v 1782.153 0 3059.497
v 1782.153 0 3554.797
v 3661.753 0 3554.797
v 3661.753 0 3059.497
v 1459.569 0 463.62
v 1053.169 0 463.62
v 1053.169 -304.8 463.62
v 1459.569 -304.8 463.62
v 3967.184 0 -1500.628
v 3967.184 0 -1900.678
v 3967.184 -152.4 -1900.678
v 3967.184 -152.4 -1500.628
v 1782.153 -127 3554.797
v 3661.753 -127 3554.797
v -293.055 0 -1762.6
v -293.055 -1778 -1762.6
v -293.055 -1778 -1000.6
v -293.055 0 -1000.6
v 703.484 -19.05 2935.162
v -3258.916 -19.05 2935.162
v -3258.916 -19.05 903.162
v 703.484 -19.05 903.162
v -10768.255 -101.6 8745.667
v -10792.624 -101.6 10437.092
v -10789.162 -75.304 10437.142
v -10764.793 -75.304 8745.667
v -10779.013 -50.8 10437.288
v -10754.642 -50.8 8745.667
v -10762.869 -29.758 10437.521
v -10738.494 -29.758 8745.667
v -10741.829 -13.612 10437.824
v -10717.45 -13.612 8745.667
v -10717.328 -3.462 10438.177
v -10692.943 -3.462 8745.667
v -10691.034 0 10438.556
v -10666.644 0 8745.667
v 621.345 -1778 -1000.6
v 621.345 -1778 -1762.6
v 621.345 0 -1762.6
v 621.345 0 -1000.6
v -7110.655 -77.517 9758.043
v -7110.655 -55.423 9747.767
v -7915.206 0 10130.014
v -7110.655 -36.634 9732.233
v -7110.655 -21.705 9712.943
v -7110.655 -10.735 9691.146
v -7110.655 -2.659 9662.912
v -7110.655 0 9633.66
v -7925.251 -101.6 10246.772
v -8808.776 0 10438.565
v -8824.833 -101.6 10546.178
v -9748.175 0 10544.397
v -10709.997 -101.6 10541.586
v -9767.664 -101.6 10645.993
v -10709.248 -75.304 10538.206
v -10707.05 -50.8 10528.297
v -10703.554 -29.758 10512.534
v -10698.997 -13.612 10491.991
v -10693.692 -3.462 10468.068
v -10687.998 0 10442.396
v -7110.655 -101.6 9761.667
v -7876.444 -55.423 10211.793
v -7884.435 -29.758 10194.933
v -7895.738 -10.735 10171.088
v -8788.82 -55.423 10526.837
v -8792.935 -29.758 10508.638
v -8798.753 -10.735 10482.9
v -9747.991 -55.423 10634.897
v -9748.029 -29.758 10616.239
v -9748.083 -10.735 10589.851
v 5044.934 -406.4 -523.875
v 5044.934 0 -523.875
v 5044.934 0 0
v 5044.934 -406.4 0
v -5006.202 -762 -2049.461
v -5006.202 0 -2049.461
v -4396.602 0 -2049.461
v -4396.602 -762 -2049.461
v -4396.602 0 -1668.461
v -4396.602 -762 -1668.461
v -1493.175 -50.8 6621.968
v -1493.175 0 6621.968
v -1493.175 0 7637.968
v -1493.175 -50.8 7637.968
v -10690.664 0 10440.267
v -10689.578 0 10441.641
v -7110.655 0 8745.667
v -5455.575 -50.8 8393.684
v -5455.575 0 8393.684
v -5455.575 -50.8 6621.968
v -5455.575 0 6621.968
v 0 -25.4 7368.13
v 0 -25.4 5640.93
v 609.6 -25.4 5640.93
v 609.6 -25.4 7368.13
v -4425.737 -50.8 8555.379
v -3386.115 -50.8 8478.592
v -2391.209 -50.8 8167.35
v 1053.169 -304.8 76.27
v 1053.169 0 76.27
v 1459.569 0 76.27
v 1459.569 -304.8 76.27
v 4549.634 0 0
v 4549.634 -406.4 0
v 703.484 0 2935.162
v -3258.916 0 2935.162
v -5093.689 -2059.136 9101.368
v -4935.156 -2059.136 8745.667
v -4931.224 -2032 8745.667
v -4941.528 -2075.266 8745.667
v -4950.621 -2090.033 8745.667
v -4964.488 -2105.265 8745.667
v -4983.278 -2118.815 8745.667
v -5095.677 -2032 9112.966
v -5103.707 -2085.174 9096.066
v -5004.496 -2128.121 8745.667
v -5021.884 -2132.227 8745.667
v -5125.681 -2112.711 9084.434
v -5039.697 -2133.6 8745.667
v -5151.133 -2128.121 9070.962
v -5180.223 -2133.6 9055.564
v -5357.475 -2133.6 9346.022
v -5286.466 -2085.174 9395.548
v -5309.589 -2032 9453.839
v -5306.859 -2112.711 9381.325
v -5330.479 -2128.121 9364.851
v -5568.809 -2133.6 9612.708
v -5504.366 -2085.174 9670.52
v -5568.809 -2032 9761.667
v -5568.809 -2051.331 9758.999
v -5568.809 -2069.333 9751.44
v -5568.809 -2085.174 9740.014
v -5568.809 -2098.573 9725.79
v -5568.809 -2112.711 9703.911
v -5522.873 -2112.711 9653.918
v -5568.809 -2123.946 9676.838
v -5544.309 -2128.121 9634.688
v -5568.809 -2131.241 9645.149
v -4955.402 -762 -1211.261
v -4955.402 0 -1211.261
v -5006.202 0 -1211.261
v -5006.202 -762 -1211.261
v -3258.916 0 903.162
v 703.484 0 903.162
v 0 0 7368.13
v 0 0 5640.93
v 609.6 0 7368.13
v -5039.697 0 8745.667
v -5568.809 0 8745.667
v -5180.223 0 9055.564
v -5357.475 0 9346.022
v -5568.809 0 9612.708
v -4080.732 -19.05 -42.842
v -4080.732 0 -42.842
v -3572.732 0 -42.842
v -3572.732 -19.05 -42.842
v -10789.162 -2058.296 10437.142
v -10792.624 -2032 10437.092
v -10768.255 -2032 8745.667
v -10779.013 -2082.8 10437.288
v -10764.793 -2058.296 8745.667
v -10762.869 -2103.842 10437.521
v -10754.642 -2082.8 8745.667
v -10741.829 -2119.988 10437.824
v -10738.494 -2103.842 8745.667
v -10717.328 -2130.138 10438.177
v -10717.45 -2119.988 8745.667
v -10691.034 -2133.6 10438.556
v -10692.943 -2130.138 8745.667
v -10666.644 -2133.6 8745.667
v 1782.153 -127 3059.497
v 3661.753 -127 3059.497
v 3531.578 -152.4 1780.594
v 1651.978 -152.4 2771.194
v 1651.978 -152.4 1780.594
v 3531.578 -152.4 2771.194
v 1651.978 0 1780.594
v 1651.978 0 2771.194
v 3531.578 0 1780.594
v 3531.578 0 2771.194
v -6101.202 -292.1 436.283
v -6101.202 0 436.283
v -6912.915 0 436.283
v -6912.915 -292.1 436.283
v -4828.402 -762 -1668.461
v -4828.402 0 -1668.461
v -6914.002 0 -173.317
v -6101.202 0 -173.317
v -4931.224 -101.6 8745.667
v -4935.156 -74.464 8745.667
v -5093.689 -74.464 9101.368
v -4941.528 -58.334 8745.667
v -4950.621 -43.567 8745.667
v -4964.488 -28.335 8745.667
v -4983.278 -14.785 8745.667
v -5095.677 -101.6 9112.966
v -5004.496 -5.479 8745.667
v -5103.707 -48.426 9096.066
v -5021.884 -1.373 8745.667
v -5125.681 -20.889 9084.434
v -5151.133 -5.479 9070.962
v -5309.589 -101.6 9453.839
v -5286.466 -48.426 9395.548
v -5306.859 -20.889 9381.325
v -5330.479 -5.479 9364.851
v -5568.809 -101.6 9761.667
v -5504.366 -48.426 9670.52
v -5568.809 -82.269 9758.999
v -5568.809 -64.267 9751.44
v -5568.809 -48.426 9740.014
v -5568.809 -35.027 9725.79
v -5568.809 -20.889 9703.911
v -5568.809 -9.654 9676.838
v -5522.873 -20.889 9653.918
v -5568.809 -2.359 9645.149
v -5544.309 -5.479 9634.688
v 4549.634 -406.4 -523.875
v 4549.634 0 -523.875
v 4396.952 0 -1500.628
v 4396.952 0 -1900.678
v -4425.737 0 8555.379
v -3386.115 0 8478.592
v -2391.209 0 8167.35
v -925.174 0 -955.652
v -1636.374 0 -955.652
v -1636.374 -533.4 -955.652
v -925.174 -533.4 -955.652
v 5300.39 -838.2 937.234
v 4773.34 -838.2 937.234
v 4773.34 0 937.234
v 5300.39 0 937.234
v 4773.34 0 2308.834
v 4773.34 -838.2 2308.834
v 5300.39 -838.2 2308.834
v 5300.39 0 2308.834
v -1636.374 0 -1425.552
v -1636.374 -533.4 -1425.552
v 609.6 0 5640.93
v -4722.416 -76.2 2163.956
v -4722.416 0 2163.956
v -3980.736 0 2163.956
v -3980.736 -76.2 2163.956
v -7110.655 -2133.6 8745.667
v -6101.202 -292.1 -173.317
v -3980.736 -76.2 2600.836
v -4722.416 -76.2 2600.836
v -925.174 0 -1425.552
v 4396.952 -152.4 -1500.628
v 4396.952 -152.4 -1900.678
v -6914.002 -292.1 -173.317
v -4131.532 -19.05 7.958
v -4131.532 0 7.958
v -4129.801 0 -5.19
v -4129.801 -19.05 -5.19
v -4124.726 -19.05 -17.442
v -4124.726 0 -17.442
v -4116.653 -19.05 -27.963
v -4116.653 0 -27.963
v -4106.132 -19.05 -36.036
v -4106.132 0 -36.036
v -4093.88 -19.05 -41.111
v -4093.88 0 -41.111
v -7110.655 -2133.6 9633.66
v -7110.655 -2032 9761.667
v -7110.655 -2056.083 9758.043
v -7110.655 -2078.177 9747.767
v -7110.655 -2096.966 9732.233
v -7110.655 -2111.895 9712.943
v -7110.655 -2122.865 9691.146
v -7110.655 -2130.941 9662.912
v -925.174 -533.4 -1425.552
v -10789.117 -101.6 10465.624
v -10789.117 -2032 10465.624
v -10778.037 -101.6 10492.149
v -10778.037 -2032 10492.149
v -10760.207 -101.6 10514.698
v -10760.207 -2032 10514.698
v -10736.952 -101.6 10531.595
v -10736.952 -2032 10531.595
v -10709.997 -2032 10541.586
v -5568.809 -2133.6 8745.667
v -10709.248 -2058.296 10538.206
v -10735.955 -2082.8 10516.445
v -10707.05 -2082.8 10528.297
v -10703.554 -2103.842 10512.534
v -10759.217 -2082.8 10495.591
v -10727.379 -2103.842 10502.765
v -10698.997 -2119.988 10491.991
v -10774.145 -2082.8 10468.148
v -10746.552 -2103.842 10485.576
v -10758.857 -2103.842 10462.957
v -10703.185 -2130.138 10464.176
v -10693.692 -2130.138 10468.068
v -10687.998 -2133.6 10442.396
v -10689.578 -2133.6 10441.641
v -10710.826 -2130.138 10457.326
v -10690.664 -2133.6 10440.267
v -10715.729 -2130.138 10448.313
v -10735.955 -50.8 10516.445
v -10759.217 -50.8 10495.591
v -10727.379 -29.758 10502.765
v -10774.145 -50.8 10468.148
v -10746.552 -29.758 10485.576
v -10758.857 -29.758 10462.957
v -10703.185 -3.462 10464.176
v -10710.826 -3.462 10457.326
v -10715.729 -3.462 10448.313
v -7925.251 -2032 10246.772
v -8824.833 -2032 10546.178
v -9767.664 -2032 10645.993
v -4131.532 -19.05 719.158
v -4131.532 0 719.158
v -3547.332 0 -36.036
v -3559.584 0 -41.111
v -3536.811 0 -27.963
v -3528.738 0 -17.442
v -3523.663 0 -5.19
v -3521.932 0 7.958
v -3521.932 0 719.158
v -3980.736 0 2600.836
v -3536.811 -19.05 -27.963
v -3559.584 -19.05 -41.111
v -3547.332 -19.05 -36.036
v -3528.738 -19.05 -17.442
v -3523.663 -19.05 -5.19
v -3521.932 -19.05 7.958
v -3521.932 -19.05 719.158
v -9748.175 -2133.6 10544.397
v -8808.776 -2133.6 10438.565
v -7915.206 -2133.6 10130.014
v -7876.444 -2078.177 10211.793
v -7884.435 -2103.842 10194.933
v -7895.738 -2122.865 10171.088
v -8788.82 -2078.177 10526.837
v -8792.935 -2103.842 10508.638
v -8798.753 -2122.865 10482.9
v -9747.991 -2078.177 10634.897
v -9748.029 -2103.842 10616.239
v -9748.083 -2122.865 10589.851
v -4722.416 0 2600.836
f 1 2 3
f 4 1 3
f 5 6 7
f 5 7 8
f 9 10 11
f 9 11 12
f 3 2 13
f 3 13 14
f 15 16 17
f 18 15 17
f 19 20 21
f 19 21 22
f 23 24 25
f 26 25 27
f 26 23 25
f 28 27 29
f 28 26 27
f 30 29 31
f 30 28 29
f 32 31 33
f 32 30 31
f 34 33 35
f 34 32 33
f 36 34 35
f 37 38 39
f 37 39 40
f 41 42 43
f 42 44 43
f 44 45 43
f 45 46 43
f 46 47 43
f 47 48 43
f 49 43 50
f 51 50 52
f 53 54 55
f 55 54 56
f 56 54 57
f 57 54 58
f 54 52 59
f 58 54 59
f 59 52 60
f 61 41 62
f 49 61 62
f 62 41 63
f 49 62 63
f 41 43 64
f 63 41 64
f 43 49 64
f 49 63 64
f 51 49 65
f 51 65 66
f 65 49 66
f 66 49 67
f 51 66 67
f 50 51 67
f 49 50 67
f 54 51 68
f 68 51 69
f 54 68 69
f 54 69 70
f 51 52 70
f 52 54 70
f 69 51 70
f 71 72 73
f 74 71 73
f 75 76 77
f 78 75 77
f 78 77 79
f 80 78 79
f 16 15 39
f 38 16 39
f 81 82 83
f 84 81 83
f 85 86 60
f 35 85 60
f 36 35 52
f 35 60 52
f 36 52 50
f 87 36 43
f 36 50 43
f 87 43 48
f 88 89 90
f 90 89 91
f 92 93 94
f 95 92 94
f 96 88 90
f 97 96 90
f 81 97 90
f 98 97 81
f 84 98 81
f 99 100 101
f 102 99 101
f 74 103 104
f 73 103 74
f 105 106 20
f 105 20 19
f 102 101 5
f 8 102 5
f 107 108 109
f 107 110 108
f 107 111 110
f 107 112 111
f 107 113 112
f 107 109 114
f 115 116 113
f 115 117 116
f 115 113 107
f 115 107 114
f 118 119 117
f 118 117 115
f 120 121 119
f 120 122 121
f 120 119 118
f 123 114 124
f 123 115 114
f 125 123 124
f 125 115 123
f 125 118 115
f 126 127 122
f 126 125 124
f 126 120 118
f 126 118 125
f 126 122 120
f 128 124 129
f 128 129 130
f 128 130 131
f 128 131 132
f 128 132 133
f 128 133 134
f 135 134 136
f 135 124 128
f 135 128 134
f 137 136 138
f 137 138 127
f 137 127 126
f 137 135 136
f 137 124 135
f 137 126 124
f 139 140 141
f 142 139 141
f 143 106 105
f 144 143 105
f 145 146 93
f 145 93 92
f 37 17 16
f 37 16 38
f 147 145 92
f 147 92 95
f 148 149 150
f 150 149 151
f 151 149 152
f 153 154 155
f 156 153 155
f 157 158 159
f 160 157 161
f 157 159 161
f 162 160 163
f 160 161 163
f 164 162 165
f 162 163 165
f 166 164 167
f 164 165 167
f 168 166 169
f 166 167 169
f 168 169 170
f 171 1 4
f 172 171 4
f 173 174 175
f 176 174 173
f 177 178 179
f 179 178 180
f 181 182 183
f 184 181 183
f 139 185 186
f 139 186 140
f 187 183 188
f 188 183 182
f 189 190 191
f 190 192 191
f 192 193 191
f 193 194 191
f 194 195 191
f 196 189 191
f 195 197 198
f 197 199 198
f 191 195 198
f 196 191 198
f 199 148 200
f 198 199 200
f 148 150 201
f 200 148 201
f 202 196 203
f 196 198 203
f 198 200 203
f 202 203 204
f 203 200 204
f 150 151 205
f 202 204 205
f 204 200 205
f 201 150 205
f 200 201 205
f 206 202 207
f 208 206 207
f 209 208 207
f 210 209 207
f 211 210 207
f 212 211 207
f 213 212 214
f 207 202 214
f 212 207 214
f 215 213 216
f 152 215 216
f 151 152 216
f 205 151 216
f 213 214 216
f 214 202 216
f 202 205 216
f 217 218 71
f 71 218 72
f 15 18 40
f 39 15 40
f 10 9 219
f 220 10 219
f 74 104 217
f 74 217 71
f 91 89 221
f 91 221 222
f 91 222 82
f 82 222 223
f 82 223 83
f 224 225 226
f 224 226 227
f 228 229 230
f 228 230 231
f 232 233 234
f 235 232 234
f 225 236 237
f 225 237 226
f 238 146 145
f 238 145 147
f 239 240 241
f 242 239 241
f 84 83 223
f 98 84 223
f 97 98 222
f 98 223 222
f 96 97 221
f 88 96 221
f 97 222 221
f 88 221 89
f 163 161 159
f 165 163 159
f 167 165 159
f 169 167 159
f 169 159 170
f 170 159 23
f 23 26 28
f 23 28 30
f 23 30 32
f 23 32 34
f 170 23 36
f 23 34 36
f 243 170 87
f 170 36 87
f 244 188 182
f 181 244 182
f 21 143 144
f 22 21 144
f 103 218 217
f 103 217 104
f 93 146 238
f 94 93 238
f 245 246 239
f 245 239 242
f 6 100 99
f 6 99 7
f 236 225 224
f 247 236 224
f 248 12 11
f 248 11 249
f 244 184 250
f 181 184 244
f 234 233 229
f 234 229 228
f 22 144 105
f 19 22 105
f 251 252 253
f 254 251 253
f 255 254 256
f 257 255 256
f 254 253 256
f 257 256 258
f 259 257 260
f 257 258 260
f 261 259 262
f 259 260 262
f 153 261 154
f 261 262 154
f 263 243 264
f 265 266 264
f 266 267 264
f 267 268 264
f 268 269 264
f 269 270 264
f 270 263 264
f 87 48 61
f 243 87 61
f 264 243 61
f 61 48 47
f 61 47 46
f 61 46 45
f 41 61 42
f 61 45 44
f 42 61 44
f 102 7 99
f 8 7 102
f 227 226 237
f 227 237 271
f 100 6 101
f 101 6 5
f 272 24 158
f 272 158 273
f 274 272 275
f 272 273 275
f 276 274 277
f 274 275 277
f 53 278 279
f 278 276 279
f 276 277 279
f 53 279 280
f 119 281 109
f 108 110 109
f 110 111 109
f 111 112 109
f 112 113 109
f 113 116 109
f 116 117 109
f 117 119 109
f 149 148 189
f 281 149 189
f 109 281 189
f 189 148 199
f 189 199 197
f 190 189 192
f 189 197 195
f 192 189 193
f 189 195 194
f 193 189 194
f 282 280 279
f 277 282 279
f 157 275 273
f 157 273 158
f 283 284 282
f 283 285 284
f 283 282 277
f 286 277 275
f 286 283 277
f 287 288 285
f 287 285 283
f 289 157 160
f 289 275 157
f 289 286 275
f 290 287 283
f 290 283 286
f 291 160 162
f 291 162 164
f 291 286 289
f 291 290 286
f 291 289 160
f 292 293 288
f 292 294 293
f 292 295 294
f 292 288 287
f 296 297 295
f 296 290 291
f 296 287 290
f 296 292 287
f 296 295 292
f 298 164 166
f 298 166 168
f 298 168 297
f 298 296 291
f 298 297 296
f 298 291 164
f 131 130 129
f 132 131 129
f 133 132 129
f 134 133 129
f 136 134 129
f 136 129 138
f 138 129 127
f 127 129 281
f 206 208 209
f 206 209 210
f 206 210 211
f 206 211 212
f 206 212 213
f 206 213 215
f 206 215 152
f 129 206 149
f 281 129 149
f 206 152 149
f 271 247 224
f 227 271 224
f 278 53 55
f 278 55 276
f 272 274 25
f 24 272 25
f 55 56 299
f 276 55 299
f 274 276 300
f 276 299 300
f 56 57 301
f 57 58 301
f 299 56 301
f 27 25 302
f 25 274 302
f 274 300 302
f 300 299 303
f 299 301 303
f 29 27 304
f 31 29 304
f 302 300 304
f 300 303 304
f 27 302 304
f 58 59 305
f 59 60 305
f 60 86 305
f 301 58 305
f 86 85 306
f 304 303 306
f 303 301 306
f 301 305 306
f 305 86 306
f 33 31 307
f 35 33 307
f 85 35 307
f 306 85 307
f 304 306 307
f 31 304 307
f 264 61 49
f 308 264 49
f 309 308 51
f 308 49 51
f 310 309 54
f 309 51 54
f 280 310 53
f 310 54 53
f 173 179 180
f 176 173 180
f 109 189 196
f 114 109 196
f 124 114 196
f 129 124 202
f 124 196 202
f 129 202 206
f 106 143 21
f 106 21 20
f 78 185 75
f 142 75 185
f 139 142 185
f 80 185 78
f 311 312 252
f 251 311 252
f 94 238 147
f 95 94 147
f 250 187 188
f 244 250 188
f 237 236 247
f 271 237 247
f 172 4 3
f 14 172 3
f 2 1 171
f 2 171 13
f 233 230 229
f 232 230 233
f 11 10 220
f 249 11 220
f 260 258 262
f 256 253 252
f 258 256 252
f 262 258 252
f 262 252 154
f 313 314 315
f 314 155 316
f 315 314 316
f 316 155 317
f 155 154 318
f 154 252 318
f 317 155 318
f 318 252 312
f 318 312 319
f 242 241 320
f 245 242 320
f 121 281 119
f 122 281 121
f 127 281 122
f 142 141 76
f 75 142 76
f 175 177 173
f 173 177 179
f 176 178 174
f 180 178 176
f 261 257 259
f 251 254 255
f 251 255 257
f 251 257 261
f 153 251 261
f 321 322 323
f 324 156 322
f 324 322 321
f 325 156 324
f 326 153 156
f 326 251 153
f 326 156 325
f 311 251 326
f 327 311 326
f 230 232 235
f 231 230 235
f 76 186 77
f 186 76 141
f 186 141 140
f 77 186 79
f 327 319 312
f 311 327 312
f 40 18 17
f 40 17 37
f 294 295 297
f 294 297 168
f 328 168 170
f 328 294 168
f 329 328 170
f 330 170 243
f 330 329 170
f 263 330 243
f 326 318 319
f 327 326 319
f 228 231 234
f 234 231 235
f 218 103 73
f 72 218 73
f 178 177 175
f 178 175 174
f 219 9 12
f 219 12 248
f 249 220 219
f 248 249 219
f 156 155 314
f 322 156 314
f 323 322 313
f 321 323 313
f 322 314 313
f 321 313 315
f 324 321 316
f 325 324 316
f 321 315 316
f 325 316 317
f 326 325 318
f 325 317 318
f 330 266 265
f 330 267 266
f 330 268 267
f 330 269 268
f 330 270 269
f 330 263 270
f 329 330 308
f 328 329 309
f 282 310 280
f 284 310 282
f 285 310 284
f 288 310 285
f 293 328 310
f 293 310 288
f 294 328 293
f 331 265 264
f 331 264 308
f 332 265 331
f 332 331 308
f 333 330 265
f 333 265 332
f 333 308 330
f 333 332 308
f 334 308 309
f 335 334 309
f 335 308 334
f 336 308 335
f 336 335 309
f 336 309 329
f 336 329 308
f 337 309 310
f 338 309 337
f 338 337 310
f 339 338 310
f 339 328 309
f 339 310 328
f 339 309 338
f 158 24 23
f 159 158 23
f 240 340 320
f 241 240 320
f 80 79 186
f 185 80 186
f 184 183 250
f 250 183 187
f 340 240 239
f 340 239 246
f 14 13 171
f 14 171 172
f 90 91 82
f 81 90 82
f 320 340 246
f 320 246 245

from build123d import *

# Parameters (mm, degrees)
F0_W      = 3962.4
F0_H      = 2032
F1_DEPTH  = 19.05
F0_W_2    = 527.05
F0_H_2    = 1371.6
F2_DEPTH  = 838.2
F0_W_3    = 495.3
F0_H_3    = 523.875
F3_DEPTH  = 406.4
F0_W_4    = 429.768
F0_H_4    = 400.05
F4_DEPTH  = 152.4
F0_W_5    = 741.68
F0_H_5    = 436.88
F5_DEPTH  = 76.2
F6_DEPTH  = 50.8
F7_DEPTH  = 19.05
F8_DEPTH  = 762
F9_DEPTH  = 2133.6
F0_W_6    = 609.6
F0_H_6    = 1727.2
F10_DEPTH = 25.4
F0_W_7    = 406.4
F0_H_7    = 387.35
F11_DEPTH = 304.8
F0_W_8    = 914.4
F0_H_8    = 762
F12_DEPTH = 1778
F0_W_9    = 711.2
F0_H_9    = 469.9
F13_DEPTH = 533.4
F14_DEPTH = 2133.6
F15_R     = 105.4762589975
F16_R     = 101.6
F16_2_R   = 101.6
F0_W_10   = 1879.6
F0_H_10   = 990.6
F17_DEPTH = 152.4
F18_DEPTH = 292.1
F0_H_11   = 495.3
F19_DEPTH = 127


# Not quite as in the source:
# - ends of sketch curves that miss each other by under 0.0002 mm in the source are joined


with BuildPart() as f1:
    # F0 (on Front) → F1 (new body)
    with BuildSketch(Plane.XZ):
        with Locations((-1277.7160794973, 1919.1620025635)):
            Rectangle(F0_W, F0_H)
    extrude(amount=F1_DEPTH)


with BuildPart() as f2:
    # F0 (on Front) → F2 (new body)
    with BuildSketch(Plane.XZ):
        with Locations((5036.8647483826, 1623.0339844704)):
            Rectangle(F0_W_2, F0_H_2)
    extrude(amount=F2_DEPTH)


with BuildPart() as f3:
    # F0 (on Front) → F3 (new body)
    with BuildSketch(Plane.XZ):
        with Locations((4797.2844566345, -261.9375)):
            Rectangle(F0_W_3, F0_H_3)
    extrude(amount=F3_DEPTH)


with BuildPart() as f4:
    # F0 (on Front) → F4 (new body)
    with BuildSketch(Plane.XZ):
        with Locations((4182.0682132568, -1700.6525627136)):
            Rectangle(F0_W_4, F0_H_4)
    extrude(amount=F4_DEPTH)


with BuildPart() as f5:
    # F0 (on Front) → F5 (new body)
    with BuildSketch(Plane.XZ):
        with Locations((-4351.5760449982, 2382.3956884766)):
            Rectangle(F0_W_5, F0_H_5)
    extrude(amount=F5_DEPTH)


with BuildPart() as f6:
    # F0 (on Front) → F6 (new body)
    with BuildSketch(Plane.XZ):
        with BuildLine():
            Line((-5455.5745124817, 8393.684387207), (-5455.5745124817, 6621.967618318))
            Line((-5455.5745124817, 6621.967618318), (-1493.1745124817, 6621.967618318))
            Line((-1493.1745124817, 6621.967618318), (-1493.1745124817, 7637.967618318))
            ThreePointArc((-1493.1745124817, 7637.967618318), (-3386.1147979663, 8478.5923554399), (-5455.5745124817, 8393.684387207))
        make_face()
    extrude(amount=F6_DEPTH)


with BuildPart() as f7:
    # F0 (on Front) → F7 (new body)
    with BuildSketch(Plane.XZ):
        with BuildLine():
            Line((-3521.931886673, 719.1577055931), (-4131.531886673, 719.1577055931))
            Line((-4131.531886673, 719.1577055931), (-4131.531886673, 7.9577055931))
            ThreePointArc((-4131.531886673, 7.9577055931), (-4116.6529111573, -27.9633188912), (-4080.731886673, -42.8422944069))
            Line((-4080.731886673, -42.8422944069), (-3572.731886673, -42.8422944069))
            ThreePointArc((-3572.731886673, -42.8422944069), (-3536.8108621887, -27.9633188912), (-3521.931886673, 7.9577055931))
            Line((-3521.931886673, 7.9577055931), (-3521.931886673, 719.1577055931))
        make_face()
    extrude(amount=F7_DEPTH)


with BuildPart() as f8:
    # F0 (on Front) → F8 (new body)
    with BuildSketch(Plane.XZ):
        Polygon((-4828.4018974304, -1668.460726738), (-4955.4018974304, -1211.260726738), (-5006.2018974304, -1211.260726738), (-5006.2018974304, -2049.460726738), (-4955.4018974304, -2049.460726738), (-4396.6018974304, -2049.460726738), (-4396.6018974304, -1668.460726738), align=None)
    extrude(amount=F8_DEPTH)


with BuildPart() as f9:
    # F0 (on Front) → F9 (new body)
    with BuildSketch(Plane.XZ):
        with BuildLine():
            Line((-10793.848991394, 10522.1261978149), (-10768.254913326, 8745.6674575806))
            Line((-10768.254913326, 8745.6674575806), (-7110.654913326, 8745.6674575806))
            Line((-7110.654913326, 8745.6674575806), (-7110.654913326, 9761.6674575806))
            ThreePointArc((-7110.654913326, 9761.6674575806), (-8866.9417812081, 10555.0867886532), (-10793.848991394, 10522.1261978149))
        make_face()
    extrude(amount=F9_DEPTH)

    # F15
    f15_edges = [f9.edges().sort_by_distance(p)[0] for p in [
        (-10793.848991, -1066.8, 10522.126198),
    ]]
    fillet(f15_edges, radius=F15_R)

    # F16
    f16_edges = [f9.edges().sort_by_distance(p)[0] for p in [
        (-10780.439396, -2133.6, 9591.379922),
        (-10780.439396, 0, 9591.379922),
    ]]
    fillet(f16_edges, radius=F16_R)


with BuildPart() as f10:
    # F0 (on Front) → F10 (new body)
    with BuildSketch(Plane.XZ):
        with Locations((304.8, 6504.5301757813)):
            Rectangle(F0_W_6, F0_H_6)
    extrude(amount=F10_DEPTH)


with BuildPart() as f11:
    # F0 (on Front) → F11 (new body)
    with BuildSketch(Plane.XZ):
        with Locations((1256.3688928604, 269.9453348637)):
            Rectangle(F0_W_7, F0_H_7)
    extrude(amount=F11_DEPTH)


with BuildPart() as f12:
    # F0 (on Front) → F12 (new body)
    with BuildSketch(Plane.XZ):
        with Locations((164.1450090408, -1381.5999803543)):
            Rectangle(F0_W_8, F0_H_8)
    extrude(amount=F12_DEPTH)


with BuildPart() as f13:
    # F0 (on Front) → F13 (new body)
    with BuildSketch(Plane.XZ):
        with Locations((-1280.7739883423, -1190.6021306038)):
            Rectangle(F0_W_9, F0_H_9)
    extrude(amount=F13_DEPTH)


with BuildPart() as f14:
    # F0 (on Front) → F14 (new body)
    with BuildSketch(Plane.XZ):
        with BuildLine():
            Line((-5568.809122225, 9761.6674575806), (-5568.809122225, 8745.6674575806))
            Line((-5568.809122225, 8745.6674575806), (-4931.2243461609, 8745.6674575806))
            ThreePointArc((-4931.2243461609, 8745.6674575806), (-5196.6883972792, 9287.1333392233), (-5568.809122225, 9761.6674575806))
        make_face()
    extrude(amount=F14_DEPTH)

    # F16#2
    f16_2_edges = [f14.edges().sort_by_distance(p)[0] for p in [
        (-5196.688397, -2133.6, 9287.133339),
        (-5196.688397, 0, 9287.133339),
    ]]
    fillet(f16_2_edges, radius=F16_2_R)


with BuildPart() as f17:
    # F0 (on Front) → F17 (new body)
    with BuildSketch(Plane.XZ):
        with Locations((2591.7781351089, 2275.894433403)):
            Rectangle(F0_W_10, F0_H_10)
    extrude(amount=F17_DEPTH)


with BuildPart() as f18:
    # F0 (on Front) → F18 (new body)
    with BuildSketch(Plane.XZ):
        Polygon((-6101.2024879456, -173.3167171478), (-6101.2024879456, 436.2832828522), (-6912.9147529602, 436.2832828522), (-6914.0024185181, -173.3167171478), align=None)
    extrude(amount=F18_DEPTH)


with BuildPart() as f19:
    # F0 (on Front) → F19 (new body)
    with BuildSketch(Plane.XZ):
        with Locations((2721.9534678528, 3307.1471179962)):
            Rectangle(F0_W_10, F0_H_11)
    extrude(amount=F19_DEPTH)


solid = Compound([f1.part, f2.part, f3.part, f4.part, f5.part, f6.part, f7.part, f8.part, f9.part, f10.part, f11.part, f12.part, f13.part, f14.part, f17.part, f18.part, f19.part])
